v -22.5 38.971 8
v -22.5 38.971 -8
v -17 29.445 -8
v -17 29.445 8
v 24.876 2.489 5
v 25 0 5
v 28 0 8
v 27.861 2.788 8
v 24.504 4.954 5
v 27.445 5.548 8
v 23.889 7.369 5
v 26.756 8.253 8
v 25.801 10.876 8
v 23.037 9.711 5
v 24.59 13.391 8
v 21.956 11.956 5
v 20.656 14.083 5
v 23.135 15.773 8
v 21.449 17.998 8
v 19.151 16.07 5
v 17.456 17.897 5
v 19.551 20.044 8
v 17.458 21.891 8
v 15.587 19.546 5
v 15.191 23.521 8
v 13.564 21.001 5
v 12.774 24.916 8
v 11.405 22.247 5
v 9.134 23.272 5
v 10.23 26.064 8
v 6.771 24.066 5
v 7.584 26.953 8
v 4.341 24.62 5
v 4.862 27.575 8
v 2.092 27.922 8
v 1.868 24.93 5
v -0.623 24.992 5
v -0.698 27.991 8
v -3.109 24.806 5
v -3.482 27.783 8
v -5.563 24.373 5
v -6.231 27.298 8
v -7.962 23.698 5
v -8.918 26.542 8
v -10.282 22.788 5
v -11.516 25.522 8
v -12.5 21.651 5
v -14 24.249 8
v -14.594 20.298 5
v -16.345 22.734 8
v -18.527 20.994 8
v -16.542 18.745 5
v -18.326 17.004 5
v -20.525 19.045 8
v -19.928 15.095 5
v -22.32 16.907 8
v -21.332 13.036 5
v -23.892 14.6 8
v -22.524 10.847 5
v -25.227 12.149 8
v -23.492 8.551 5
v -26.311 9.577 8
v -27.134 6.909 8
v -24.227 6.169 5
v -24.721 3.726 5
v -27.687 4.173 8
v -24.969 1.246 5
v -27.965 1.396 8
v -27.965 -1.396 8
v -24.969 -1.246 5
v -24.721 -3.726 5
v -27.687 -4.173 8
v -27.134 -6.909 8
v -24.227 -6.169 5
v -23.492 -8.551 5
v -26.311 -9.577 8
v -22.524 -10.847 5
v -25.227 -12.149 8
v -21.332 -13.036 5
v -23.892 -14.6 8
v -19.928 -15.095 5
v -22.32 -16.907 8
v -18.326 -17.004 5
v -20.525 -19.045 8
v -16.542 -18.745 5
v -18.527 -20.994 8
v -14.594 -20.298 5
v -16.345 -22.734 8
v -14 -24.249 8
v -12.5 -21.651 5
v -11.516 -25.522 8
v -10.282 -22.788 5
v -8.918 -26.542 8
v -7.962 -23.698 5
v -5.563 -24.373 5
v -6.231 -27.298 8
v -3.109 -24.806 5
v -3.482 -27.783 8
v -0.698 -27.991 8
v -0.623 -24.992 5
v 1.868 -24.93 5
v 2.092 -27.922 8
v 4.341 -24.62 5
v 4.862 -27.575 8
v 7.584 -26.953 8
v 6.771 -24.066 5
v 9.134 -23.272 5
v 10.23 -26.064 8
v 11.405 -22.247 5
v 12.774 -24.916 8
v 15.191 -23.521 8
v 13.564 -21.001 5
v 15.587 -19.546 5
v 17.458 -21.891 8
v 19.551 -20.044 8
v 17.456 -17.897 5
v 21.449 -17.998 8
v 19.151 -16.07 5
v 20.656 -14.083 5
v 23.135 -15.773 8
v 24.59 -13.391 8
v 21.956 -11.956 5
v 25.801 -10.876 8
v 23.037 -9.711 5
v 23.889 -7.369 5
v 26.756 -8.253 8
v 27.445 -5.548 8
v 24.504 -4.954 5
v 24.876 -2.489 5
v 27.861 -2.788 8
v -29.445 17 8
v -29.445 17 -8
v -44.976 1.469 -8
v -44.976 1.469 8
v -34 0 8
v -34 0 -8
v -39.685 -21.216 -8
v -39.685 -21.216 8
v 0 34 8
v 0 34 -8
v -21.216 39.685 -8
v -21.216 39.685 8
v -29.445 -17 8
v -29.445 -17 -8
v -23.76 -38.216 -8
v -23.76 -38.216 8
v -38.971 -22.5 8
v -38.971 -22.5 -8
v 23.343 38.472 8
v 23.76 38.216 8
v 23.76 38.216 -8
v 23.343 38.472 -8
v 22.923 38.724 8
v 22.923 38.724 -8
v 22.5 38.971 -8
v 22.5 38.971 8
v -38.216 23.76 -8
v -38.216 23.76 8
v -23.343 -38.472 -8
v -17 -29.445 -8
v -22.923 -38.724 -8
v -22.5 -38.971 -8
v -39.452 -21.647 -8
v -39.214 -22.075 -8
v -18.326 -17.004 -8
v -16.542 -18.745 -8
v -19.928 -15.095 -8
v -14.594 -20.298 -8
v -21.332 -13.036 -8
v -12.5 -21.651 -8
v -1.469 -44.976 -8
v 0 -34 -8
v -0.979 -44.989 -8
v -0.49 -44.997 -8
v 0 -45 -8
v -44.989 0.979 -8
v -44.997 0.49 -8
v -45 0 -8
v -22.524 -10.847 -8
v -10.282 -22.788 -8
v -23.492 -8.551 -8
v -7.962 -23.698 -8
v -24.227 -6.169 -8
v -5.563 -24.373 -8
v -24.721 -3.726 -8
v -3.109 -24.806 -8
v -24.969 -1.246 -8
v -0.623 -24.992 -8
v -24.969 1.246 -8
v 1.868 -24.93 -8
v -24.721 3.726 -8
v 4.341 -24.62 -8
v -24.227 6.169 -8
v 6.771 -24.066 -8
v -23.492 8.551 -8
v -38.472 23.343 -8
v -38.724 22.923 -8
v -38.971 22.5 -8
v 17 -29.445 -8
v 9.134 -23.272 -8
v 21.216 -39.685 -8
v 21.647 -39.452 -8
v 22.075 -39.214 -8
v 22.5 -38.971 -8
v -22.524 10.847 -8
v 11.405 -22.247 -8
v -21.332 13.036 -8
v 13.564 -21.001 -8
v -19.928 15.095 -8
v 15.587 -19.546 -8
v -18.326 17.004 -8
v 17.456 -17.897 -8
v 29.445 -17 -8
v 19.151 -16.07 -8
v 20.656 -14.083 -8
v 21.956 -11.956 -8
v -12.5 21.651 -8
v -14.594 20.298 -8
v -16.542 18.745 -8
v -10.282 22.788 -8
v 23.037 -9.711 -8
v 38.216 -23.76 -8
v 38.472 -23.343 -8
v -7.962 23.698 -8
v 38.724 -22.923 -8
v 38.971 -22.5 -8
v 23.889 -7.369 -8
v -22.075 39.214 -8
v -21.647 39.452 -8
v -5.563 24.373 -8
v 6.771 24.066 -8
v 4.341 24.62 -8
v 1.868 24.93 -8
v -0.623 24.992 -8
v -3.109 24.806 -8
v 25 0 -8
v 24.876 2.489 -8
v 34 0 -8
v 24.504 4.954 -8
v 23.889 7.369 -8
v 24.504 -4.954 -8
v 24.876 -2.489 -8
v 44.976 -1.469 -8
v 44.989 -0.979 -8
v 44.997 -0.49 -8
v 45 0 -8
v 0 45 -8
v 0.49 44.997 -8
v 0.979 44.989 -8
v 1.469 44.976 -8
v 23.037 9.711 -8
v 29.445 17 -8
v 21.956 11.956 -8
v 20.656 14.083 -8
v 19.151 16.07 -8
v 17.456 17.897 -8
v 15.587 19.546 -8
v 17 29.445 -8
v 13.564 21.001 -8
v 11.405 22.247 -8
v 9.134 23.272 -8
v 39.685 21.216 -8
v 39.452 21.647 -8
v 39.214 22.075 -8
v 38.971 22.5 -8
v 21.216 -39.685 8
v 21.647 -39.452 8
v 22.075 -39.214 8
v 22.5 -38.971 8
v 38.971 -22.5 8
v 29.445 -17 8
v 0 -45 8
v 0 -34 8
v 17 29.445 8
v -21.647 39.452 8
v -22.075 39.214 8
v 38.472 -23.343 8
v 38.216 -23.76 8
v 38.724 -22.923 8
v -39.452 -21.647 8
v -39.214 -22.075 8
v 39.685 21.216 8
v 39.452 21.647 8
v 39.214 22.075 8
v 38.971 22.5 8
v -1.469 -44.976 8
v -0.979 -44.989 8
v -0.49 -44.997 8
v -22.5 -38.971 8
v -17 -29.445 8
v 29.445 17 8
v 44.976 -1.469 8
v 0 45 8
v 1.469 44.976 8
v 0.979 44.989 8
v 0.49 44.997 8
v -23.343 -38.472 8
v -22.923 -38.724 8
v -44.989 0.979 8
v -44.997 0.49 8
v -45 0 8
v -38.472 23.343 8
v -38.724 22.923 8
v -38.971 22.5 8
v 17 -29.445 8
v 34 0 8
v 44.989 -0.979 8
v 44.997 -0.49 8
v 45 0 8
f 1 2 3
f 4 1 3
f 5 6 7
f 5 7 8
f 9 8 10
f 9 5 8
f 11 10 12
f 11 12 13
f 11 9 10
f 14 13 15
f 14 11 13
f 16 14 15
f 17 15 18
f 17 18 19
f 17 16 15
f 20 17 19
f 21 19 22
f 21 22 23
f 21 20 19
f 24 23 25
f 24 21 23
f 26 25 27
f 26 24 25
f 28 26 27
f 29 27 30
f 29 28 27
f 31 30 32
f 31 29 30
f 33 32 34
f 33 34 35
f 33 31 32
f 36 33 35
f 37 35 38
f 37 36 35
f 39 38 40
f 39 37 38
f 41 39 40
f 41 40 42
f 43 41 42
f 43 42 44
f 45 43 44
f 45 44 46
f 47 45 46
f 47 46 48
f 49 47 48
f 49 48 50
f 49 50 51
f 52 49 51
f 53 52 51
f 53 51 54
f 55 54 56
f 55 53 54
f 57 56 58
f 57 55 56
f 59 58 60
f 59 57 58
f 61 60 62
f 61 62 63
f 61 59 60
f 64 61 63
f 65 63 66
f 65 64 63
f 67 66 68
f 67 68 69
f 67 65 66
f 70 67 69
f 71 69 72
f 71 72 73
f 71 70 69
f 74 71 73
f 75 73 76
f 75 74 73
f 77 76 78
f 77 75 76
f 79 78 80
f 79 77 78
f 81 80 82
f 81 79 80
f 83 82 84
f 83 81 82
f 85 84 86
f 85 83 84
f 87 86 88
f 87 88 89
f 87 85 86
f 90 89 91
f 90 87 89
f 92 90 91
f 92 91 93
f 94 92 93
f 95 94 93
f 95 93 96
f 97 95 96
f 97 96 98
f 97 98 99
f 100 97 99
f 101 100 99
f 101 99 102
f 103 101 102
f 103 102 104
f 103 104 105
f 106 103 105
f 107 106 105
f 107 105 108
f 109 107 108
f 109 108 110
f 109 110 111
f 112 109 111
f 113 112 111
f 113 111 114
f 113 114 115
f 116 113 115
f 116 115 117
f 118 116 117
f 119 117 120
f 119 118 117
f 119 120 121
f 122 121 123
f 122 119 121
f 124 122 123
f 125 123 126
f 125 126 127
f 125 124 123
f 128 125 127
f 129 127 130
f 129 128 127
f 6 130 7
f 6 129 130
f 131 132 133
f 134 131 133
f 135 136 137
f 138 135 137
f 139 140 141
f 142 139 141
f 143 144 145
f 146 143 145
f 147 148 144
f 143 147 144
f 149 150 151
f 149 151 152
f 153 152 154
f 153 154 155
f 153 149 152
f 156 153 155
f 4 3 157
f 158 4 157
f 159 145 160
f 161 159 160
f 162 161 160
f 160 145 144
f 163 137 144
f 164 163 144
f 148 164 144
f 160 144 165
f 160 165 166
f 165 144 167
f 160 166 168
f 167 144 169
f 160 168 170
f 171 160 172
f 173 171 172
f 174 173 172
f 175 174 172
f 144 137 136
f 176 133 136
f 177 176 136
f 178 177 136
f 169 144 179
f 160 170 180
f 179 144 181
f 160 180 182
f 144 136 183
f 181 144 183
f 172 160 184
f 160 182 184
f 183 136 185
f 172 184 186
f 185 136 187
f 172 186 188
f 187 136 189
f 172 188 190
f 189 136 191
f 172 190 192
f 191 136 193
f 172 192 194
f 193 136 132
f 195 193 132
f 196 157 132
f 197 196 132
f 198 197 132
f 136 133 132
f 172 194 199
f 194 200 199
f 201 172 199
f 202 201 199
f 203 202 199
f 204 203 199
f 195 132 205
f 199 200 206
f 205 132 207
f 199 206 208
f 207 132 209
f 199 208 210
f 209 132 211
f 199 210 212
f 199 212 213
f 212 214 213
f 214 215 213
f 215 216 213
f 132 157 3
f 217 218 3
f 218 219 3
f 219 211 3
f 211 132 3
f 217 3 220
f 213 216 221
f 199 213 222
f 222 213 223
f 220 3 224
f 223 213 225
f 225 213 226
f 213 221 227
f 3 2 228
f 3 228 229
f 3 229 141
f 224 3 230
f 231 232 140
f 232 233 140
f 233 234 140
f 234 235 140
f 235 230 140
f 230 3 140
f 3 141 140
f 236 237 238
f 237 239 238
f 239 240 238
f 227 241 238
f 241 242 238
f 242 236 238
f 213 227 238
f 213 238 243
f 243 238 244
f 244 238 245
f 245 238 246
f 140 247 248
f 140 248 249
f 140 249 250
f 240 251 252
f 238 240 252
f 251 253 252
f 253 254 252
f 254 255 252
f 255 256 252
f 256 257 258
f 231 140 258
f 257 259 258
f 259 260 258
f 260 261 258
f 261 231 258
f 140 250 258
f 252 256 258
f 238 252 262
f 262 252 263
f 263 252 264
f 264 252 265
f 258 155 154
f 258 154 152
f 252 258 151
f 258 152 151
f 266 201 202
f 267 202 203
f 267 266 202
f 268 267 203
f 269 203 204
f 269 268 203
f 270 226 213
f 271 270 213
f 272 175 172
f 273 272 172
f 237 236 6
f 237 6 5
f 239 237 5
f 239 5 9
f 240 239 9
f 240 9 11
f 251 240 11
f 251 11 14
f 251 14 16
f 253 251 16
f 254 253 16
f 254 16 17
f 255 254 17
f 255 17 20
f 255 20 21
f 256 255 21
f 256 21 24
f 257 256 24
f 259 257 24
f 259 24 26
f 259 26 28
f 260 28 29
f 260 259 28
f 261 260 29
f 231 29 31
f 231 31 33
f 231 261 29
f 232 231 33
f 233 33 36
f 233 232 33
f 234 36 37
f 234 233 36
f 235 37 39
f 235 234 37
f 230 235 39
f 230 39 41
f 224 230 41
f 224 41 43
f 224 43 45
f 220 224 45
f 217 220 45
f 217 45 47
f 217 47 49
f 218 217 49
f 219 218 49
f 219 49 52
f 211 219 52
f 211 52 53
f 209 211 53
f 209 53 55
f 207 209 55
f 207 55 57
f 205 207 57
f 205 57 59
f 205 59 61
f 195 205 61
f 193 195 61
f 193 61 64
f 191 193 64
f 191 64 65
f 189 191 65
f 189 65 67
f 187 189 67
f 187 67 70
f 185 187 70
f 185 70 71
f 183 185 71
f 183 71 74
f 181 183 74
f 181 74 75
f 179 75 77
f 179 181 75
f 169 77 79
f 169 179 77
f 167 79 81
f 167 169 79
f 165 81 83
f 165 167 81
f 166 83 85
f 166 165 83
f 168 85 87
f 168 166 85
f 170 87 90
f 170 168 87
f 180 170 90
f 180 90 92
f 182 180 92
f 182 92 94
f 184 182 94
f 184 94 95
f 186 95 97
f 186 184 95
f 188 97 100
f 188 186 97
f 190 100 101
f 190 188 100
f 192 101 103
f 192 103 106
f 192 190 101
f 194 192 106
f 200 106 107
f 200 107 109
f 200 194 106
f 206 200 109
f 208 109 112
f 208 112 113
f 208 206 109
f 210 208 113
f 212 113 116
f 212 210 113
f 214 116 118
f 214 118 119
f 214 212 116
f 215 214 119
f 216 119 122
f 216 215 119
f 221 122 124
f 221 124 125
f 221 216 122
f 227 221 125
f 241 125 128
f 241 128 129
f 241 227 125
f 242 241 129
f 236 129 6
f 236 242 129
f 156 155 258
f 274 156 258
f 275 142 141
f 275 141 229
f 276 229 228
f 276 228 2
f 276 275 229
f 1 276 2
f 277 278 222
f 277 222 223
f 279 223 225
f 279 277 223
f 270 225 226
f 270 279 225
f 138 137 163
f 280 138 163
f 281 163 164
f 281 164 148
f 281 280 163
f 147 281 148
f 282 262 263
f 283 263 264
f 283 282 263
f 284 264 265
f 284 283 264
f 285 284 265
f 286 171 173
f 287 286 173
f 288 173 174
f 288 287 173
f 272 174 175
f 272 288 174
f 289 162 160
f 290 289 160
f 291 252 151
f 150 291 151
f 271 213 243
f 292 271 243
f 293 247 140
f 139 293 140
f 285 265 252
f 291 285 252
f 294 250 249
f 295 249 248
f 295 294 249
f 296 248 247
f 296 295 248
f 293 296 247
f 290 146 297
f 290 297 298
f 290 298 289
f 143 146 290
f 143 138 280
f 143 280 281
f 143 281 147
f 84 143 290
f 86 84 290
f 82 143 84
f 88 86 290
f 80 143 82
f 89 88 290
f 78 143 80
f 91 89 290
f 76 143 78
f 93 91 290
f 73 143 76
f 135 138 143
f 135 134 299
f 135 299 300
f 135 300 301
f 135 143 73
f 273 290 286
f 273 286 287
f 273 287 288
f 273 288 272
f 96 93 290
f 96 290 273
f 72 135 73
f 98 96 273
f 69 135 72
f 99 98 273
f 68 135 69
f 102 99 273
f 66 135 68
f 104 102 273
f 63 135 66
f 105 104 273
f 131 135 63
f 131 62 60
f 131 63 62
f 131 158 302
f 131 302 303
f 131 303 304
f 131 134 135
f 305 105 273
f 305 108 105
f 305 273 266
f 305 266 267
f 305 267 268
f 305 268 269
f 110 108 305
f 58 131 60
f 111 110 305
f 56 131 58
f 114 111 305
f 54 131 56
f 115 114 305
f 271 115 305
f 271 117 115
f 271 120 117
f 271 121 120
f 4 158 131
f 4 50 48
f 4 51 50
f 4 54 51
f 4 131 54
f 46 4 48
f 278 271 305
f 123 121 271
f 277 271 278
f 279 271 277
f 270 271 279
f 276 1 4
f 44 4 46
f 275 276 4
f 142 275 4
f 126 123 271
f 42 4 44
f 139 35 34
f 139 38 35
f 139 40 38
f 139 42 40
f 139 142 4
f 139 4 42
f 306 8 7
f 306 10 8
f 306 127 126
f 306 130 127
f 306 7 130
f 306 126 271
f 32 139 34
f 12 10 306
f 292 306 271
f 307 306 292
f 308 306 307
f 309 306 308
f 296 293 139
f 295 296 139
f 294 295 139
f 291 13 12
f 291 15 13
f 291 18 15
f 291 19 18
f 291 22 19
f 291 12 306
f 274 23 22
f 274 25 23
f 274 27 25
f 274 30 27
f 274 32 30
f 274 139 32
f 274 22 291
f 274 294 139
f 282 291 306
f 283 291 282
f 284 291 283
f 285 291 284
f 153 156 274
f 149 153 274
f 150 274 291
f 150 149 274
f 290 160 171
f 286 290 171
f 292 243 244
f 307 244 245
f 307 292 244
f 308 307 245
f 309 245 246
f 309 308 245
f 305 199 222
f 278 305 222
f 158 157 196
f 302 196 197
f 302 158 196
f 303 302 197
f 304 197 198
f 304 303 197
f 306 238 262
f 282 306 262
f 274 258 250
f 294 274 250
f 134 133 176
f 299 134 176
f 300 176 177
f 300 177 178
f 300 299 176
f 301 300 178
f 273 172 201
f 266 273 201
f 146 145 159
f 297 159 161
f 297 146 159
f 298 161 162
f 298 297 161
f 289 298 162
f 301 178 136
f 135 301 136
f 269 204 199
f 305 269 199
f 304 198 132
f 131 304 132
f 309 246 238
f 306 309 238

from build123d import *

# Parameters (mm, degrees)
SKETCH1_R           = 45
SKETCH1_R_2         = 25
BOSS_EXTRUDE1_DEPTH = 8
CHAMFER1_SIZE       = 3
CUT_EXTRUDE1_START  = -17
CUT_EXTRUDE1_DEPTH  = 18
CIRPATTERN1_COUNT   = 12


with BuildPart() as part:
    # Sketch1 → Boss-Extrude1 (new body, symmetric)
    with BuildSketch(Plane.XY):
        Circle(SKETCH1_R)
        Circle(SKETCH1_R_2, mode=Mode.SUBTRACT)
    extrude(amount=BOSS_EXTRUDE1_DEPTH, both=True)

    # Chamfer1
    chamfer1_edges = [part.edges().sort_by_distance(p)[0] for p in [
        (-25, 0, 8),
    ]]
    chamfer(chamfer1_edges, length=CHAMFER1_SIZE)

    # Sketch2 → Cut-Extrude1 (cut)
    with BuildSketch(Plane.XY.offset(8).offset(CUT_EXTRUDE1_START)):
        with BuildLine():
            Line((0, 45), (0, 34))
            Line((0, 34), (-21.215955949, 39.684798263))
            ThreePointArc((-21.215955949, 39.684798263), (-10.935814514, 43.650978923), (0, 45))
        make_face()
    cut_extrude1 = extrude(amount=CUT_EXTRUDE1_DEPTH, mode=Mode.SUBTRACT)

    # CirPattern1: Cut-Extrude1 ×12 about axis
    cirpattern1_axis = Axis((0, 0, 0), (0, 0, 1))
    for i in range(1, CIRPATTERN1_COUNT):
        add(cut_extrude1.rotate(cirpattern1_axis, i * 360 / CIRPATTERN1_COUNT), mode=Mode.SUBTRACT)


solid = part.part
